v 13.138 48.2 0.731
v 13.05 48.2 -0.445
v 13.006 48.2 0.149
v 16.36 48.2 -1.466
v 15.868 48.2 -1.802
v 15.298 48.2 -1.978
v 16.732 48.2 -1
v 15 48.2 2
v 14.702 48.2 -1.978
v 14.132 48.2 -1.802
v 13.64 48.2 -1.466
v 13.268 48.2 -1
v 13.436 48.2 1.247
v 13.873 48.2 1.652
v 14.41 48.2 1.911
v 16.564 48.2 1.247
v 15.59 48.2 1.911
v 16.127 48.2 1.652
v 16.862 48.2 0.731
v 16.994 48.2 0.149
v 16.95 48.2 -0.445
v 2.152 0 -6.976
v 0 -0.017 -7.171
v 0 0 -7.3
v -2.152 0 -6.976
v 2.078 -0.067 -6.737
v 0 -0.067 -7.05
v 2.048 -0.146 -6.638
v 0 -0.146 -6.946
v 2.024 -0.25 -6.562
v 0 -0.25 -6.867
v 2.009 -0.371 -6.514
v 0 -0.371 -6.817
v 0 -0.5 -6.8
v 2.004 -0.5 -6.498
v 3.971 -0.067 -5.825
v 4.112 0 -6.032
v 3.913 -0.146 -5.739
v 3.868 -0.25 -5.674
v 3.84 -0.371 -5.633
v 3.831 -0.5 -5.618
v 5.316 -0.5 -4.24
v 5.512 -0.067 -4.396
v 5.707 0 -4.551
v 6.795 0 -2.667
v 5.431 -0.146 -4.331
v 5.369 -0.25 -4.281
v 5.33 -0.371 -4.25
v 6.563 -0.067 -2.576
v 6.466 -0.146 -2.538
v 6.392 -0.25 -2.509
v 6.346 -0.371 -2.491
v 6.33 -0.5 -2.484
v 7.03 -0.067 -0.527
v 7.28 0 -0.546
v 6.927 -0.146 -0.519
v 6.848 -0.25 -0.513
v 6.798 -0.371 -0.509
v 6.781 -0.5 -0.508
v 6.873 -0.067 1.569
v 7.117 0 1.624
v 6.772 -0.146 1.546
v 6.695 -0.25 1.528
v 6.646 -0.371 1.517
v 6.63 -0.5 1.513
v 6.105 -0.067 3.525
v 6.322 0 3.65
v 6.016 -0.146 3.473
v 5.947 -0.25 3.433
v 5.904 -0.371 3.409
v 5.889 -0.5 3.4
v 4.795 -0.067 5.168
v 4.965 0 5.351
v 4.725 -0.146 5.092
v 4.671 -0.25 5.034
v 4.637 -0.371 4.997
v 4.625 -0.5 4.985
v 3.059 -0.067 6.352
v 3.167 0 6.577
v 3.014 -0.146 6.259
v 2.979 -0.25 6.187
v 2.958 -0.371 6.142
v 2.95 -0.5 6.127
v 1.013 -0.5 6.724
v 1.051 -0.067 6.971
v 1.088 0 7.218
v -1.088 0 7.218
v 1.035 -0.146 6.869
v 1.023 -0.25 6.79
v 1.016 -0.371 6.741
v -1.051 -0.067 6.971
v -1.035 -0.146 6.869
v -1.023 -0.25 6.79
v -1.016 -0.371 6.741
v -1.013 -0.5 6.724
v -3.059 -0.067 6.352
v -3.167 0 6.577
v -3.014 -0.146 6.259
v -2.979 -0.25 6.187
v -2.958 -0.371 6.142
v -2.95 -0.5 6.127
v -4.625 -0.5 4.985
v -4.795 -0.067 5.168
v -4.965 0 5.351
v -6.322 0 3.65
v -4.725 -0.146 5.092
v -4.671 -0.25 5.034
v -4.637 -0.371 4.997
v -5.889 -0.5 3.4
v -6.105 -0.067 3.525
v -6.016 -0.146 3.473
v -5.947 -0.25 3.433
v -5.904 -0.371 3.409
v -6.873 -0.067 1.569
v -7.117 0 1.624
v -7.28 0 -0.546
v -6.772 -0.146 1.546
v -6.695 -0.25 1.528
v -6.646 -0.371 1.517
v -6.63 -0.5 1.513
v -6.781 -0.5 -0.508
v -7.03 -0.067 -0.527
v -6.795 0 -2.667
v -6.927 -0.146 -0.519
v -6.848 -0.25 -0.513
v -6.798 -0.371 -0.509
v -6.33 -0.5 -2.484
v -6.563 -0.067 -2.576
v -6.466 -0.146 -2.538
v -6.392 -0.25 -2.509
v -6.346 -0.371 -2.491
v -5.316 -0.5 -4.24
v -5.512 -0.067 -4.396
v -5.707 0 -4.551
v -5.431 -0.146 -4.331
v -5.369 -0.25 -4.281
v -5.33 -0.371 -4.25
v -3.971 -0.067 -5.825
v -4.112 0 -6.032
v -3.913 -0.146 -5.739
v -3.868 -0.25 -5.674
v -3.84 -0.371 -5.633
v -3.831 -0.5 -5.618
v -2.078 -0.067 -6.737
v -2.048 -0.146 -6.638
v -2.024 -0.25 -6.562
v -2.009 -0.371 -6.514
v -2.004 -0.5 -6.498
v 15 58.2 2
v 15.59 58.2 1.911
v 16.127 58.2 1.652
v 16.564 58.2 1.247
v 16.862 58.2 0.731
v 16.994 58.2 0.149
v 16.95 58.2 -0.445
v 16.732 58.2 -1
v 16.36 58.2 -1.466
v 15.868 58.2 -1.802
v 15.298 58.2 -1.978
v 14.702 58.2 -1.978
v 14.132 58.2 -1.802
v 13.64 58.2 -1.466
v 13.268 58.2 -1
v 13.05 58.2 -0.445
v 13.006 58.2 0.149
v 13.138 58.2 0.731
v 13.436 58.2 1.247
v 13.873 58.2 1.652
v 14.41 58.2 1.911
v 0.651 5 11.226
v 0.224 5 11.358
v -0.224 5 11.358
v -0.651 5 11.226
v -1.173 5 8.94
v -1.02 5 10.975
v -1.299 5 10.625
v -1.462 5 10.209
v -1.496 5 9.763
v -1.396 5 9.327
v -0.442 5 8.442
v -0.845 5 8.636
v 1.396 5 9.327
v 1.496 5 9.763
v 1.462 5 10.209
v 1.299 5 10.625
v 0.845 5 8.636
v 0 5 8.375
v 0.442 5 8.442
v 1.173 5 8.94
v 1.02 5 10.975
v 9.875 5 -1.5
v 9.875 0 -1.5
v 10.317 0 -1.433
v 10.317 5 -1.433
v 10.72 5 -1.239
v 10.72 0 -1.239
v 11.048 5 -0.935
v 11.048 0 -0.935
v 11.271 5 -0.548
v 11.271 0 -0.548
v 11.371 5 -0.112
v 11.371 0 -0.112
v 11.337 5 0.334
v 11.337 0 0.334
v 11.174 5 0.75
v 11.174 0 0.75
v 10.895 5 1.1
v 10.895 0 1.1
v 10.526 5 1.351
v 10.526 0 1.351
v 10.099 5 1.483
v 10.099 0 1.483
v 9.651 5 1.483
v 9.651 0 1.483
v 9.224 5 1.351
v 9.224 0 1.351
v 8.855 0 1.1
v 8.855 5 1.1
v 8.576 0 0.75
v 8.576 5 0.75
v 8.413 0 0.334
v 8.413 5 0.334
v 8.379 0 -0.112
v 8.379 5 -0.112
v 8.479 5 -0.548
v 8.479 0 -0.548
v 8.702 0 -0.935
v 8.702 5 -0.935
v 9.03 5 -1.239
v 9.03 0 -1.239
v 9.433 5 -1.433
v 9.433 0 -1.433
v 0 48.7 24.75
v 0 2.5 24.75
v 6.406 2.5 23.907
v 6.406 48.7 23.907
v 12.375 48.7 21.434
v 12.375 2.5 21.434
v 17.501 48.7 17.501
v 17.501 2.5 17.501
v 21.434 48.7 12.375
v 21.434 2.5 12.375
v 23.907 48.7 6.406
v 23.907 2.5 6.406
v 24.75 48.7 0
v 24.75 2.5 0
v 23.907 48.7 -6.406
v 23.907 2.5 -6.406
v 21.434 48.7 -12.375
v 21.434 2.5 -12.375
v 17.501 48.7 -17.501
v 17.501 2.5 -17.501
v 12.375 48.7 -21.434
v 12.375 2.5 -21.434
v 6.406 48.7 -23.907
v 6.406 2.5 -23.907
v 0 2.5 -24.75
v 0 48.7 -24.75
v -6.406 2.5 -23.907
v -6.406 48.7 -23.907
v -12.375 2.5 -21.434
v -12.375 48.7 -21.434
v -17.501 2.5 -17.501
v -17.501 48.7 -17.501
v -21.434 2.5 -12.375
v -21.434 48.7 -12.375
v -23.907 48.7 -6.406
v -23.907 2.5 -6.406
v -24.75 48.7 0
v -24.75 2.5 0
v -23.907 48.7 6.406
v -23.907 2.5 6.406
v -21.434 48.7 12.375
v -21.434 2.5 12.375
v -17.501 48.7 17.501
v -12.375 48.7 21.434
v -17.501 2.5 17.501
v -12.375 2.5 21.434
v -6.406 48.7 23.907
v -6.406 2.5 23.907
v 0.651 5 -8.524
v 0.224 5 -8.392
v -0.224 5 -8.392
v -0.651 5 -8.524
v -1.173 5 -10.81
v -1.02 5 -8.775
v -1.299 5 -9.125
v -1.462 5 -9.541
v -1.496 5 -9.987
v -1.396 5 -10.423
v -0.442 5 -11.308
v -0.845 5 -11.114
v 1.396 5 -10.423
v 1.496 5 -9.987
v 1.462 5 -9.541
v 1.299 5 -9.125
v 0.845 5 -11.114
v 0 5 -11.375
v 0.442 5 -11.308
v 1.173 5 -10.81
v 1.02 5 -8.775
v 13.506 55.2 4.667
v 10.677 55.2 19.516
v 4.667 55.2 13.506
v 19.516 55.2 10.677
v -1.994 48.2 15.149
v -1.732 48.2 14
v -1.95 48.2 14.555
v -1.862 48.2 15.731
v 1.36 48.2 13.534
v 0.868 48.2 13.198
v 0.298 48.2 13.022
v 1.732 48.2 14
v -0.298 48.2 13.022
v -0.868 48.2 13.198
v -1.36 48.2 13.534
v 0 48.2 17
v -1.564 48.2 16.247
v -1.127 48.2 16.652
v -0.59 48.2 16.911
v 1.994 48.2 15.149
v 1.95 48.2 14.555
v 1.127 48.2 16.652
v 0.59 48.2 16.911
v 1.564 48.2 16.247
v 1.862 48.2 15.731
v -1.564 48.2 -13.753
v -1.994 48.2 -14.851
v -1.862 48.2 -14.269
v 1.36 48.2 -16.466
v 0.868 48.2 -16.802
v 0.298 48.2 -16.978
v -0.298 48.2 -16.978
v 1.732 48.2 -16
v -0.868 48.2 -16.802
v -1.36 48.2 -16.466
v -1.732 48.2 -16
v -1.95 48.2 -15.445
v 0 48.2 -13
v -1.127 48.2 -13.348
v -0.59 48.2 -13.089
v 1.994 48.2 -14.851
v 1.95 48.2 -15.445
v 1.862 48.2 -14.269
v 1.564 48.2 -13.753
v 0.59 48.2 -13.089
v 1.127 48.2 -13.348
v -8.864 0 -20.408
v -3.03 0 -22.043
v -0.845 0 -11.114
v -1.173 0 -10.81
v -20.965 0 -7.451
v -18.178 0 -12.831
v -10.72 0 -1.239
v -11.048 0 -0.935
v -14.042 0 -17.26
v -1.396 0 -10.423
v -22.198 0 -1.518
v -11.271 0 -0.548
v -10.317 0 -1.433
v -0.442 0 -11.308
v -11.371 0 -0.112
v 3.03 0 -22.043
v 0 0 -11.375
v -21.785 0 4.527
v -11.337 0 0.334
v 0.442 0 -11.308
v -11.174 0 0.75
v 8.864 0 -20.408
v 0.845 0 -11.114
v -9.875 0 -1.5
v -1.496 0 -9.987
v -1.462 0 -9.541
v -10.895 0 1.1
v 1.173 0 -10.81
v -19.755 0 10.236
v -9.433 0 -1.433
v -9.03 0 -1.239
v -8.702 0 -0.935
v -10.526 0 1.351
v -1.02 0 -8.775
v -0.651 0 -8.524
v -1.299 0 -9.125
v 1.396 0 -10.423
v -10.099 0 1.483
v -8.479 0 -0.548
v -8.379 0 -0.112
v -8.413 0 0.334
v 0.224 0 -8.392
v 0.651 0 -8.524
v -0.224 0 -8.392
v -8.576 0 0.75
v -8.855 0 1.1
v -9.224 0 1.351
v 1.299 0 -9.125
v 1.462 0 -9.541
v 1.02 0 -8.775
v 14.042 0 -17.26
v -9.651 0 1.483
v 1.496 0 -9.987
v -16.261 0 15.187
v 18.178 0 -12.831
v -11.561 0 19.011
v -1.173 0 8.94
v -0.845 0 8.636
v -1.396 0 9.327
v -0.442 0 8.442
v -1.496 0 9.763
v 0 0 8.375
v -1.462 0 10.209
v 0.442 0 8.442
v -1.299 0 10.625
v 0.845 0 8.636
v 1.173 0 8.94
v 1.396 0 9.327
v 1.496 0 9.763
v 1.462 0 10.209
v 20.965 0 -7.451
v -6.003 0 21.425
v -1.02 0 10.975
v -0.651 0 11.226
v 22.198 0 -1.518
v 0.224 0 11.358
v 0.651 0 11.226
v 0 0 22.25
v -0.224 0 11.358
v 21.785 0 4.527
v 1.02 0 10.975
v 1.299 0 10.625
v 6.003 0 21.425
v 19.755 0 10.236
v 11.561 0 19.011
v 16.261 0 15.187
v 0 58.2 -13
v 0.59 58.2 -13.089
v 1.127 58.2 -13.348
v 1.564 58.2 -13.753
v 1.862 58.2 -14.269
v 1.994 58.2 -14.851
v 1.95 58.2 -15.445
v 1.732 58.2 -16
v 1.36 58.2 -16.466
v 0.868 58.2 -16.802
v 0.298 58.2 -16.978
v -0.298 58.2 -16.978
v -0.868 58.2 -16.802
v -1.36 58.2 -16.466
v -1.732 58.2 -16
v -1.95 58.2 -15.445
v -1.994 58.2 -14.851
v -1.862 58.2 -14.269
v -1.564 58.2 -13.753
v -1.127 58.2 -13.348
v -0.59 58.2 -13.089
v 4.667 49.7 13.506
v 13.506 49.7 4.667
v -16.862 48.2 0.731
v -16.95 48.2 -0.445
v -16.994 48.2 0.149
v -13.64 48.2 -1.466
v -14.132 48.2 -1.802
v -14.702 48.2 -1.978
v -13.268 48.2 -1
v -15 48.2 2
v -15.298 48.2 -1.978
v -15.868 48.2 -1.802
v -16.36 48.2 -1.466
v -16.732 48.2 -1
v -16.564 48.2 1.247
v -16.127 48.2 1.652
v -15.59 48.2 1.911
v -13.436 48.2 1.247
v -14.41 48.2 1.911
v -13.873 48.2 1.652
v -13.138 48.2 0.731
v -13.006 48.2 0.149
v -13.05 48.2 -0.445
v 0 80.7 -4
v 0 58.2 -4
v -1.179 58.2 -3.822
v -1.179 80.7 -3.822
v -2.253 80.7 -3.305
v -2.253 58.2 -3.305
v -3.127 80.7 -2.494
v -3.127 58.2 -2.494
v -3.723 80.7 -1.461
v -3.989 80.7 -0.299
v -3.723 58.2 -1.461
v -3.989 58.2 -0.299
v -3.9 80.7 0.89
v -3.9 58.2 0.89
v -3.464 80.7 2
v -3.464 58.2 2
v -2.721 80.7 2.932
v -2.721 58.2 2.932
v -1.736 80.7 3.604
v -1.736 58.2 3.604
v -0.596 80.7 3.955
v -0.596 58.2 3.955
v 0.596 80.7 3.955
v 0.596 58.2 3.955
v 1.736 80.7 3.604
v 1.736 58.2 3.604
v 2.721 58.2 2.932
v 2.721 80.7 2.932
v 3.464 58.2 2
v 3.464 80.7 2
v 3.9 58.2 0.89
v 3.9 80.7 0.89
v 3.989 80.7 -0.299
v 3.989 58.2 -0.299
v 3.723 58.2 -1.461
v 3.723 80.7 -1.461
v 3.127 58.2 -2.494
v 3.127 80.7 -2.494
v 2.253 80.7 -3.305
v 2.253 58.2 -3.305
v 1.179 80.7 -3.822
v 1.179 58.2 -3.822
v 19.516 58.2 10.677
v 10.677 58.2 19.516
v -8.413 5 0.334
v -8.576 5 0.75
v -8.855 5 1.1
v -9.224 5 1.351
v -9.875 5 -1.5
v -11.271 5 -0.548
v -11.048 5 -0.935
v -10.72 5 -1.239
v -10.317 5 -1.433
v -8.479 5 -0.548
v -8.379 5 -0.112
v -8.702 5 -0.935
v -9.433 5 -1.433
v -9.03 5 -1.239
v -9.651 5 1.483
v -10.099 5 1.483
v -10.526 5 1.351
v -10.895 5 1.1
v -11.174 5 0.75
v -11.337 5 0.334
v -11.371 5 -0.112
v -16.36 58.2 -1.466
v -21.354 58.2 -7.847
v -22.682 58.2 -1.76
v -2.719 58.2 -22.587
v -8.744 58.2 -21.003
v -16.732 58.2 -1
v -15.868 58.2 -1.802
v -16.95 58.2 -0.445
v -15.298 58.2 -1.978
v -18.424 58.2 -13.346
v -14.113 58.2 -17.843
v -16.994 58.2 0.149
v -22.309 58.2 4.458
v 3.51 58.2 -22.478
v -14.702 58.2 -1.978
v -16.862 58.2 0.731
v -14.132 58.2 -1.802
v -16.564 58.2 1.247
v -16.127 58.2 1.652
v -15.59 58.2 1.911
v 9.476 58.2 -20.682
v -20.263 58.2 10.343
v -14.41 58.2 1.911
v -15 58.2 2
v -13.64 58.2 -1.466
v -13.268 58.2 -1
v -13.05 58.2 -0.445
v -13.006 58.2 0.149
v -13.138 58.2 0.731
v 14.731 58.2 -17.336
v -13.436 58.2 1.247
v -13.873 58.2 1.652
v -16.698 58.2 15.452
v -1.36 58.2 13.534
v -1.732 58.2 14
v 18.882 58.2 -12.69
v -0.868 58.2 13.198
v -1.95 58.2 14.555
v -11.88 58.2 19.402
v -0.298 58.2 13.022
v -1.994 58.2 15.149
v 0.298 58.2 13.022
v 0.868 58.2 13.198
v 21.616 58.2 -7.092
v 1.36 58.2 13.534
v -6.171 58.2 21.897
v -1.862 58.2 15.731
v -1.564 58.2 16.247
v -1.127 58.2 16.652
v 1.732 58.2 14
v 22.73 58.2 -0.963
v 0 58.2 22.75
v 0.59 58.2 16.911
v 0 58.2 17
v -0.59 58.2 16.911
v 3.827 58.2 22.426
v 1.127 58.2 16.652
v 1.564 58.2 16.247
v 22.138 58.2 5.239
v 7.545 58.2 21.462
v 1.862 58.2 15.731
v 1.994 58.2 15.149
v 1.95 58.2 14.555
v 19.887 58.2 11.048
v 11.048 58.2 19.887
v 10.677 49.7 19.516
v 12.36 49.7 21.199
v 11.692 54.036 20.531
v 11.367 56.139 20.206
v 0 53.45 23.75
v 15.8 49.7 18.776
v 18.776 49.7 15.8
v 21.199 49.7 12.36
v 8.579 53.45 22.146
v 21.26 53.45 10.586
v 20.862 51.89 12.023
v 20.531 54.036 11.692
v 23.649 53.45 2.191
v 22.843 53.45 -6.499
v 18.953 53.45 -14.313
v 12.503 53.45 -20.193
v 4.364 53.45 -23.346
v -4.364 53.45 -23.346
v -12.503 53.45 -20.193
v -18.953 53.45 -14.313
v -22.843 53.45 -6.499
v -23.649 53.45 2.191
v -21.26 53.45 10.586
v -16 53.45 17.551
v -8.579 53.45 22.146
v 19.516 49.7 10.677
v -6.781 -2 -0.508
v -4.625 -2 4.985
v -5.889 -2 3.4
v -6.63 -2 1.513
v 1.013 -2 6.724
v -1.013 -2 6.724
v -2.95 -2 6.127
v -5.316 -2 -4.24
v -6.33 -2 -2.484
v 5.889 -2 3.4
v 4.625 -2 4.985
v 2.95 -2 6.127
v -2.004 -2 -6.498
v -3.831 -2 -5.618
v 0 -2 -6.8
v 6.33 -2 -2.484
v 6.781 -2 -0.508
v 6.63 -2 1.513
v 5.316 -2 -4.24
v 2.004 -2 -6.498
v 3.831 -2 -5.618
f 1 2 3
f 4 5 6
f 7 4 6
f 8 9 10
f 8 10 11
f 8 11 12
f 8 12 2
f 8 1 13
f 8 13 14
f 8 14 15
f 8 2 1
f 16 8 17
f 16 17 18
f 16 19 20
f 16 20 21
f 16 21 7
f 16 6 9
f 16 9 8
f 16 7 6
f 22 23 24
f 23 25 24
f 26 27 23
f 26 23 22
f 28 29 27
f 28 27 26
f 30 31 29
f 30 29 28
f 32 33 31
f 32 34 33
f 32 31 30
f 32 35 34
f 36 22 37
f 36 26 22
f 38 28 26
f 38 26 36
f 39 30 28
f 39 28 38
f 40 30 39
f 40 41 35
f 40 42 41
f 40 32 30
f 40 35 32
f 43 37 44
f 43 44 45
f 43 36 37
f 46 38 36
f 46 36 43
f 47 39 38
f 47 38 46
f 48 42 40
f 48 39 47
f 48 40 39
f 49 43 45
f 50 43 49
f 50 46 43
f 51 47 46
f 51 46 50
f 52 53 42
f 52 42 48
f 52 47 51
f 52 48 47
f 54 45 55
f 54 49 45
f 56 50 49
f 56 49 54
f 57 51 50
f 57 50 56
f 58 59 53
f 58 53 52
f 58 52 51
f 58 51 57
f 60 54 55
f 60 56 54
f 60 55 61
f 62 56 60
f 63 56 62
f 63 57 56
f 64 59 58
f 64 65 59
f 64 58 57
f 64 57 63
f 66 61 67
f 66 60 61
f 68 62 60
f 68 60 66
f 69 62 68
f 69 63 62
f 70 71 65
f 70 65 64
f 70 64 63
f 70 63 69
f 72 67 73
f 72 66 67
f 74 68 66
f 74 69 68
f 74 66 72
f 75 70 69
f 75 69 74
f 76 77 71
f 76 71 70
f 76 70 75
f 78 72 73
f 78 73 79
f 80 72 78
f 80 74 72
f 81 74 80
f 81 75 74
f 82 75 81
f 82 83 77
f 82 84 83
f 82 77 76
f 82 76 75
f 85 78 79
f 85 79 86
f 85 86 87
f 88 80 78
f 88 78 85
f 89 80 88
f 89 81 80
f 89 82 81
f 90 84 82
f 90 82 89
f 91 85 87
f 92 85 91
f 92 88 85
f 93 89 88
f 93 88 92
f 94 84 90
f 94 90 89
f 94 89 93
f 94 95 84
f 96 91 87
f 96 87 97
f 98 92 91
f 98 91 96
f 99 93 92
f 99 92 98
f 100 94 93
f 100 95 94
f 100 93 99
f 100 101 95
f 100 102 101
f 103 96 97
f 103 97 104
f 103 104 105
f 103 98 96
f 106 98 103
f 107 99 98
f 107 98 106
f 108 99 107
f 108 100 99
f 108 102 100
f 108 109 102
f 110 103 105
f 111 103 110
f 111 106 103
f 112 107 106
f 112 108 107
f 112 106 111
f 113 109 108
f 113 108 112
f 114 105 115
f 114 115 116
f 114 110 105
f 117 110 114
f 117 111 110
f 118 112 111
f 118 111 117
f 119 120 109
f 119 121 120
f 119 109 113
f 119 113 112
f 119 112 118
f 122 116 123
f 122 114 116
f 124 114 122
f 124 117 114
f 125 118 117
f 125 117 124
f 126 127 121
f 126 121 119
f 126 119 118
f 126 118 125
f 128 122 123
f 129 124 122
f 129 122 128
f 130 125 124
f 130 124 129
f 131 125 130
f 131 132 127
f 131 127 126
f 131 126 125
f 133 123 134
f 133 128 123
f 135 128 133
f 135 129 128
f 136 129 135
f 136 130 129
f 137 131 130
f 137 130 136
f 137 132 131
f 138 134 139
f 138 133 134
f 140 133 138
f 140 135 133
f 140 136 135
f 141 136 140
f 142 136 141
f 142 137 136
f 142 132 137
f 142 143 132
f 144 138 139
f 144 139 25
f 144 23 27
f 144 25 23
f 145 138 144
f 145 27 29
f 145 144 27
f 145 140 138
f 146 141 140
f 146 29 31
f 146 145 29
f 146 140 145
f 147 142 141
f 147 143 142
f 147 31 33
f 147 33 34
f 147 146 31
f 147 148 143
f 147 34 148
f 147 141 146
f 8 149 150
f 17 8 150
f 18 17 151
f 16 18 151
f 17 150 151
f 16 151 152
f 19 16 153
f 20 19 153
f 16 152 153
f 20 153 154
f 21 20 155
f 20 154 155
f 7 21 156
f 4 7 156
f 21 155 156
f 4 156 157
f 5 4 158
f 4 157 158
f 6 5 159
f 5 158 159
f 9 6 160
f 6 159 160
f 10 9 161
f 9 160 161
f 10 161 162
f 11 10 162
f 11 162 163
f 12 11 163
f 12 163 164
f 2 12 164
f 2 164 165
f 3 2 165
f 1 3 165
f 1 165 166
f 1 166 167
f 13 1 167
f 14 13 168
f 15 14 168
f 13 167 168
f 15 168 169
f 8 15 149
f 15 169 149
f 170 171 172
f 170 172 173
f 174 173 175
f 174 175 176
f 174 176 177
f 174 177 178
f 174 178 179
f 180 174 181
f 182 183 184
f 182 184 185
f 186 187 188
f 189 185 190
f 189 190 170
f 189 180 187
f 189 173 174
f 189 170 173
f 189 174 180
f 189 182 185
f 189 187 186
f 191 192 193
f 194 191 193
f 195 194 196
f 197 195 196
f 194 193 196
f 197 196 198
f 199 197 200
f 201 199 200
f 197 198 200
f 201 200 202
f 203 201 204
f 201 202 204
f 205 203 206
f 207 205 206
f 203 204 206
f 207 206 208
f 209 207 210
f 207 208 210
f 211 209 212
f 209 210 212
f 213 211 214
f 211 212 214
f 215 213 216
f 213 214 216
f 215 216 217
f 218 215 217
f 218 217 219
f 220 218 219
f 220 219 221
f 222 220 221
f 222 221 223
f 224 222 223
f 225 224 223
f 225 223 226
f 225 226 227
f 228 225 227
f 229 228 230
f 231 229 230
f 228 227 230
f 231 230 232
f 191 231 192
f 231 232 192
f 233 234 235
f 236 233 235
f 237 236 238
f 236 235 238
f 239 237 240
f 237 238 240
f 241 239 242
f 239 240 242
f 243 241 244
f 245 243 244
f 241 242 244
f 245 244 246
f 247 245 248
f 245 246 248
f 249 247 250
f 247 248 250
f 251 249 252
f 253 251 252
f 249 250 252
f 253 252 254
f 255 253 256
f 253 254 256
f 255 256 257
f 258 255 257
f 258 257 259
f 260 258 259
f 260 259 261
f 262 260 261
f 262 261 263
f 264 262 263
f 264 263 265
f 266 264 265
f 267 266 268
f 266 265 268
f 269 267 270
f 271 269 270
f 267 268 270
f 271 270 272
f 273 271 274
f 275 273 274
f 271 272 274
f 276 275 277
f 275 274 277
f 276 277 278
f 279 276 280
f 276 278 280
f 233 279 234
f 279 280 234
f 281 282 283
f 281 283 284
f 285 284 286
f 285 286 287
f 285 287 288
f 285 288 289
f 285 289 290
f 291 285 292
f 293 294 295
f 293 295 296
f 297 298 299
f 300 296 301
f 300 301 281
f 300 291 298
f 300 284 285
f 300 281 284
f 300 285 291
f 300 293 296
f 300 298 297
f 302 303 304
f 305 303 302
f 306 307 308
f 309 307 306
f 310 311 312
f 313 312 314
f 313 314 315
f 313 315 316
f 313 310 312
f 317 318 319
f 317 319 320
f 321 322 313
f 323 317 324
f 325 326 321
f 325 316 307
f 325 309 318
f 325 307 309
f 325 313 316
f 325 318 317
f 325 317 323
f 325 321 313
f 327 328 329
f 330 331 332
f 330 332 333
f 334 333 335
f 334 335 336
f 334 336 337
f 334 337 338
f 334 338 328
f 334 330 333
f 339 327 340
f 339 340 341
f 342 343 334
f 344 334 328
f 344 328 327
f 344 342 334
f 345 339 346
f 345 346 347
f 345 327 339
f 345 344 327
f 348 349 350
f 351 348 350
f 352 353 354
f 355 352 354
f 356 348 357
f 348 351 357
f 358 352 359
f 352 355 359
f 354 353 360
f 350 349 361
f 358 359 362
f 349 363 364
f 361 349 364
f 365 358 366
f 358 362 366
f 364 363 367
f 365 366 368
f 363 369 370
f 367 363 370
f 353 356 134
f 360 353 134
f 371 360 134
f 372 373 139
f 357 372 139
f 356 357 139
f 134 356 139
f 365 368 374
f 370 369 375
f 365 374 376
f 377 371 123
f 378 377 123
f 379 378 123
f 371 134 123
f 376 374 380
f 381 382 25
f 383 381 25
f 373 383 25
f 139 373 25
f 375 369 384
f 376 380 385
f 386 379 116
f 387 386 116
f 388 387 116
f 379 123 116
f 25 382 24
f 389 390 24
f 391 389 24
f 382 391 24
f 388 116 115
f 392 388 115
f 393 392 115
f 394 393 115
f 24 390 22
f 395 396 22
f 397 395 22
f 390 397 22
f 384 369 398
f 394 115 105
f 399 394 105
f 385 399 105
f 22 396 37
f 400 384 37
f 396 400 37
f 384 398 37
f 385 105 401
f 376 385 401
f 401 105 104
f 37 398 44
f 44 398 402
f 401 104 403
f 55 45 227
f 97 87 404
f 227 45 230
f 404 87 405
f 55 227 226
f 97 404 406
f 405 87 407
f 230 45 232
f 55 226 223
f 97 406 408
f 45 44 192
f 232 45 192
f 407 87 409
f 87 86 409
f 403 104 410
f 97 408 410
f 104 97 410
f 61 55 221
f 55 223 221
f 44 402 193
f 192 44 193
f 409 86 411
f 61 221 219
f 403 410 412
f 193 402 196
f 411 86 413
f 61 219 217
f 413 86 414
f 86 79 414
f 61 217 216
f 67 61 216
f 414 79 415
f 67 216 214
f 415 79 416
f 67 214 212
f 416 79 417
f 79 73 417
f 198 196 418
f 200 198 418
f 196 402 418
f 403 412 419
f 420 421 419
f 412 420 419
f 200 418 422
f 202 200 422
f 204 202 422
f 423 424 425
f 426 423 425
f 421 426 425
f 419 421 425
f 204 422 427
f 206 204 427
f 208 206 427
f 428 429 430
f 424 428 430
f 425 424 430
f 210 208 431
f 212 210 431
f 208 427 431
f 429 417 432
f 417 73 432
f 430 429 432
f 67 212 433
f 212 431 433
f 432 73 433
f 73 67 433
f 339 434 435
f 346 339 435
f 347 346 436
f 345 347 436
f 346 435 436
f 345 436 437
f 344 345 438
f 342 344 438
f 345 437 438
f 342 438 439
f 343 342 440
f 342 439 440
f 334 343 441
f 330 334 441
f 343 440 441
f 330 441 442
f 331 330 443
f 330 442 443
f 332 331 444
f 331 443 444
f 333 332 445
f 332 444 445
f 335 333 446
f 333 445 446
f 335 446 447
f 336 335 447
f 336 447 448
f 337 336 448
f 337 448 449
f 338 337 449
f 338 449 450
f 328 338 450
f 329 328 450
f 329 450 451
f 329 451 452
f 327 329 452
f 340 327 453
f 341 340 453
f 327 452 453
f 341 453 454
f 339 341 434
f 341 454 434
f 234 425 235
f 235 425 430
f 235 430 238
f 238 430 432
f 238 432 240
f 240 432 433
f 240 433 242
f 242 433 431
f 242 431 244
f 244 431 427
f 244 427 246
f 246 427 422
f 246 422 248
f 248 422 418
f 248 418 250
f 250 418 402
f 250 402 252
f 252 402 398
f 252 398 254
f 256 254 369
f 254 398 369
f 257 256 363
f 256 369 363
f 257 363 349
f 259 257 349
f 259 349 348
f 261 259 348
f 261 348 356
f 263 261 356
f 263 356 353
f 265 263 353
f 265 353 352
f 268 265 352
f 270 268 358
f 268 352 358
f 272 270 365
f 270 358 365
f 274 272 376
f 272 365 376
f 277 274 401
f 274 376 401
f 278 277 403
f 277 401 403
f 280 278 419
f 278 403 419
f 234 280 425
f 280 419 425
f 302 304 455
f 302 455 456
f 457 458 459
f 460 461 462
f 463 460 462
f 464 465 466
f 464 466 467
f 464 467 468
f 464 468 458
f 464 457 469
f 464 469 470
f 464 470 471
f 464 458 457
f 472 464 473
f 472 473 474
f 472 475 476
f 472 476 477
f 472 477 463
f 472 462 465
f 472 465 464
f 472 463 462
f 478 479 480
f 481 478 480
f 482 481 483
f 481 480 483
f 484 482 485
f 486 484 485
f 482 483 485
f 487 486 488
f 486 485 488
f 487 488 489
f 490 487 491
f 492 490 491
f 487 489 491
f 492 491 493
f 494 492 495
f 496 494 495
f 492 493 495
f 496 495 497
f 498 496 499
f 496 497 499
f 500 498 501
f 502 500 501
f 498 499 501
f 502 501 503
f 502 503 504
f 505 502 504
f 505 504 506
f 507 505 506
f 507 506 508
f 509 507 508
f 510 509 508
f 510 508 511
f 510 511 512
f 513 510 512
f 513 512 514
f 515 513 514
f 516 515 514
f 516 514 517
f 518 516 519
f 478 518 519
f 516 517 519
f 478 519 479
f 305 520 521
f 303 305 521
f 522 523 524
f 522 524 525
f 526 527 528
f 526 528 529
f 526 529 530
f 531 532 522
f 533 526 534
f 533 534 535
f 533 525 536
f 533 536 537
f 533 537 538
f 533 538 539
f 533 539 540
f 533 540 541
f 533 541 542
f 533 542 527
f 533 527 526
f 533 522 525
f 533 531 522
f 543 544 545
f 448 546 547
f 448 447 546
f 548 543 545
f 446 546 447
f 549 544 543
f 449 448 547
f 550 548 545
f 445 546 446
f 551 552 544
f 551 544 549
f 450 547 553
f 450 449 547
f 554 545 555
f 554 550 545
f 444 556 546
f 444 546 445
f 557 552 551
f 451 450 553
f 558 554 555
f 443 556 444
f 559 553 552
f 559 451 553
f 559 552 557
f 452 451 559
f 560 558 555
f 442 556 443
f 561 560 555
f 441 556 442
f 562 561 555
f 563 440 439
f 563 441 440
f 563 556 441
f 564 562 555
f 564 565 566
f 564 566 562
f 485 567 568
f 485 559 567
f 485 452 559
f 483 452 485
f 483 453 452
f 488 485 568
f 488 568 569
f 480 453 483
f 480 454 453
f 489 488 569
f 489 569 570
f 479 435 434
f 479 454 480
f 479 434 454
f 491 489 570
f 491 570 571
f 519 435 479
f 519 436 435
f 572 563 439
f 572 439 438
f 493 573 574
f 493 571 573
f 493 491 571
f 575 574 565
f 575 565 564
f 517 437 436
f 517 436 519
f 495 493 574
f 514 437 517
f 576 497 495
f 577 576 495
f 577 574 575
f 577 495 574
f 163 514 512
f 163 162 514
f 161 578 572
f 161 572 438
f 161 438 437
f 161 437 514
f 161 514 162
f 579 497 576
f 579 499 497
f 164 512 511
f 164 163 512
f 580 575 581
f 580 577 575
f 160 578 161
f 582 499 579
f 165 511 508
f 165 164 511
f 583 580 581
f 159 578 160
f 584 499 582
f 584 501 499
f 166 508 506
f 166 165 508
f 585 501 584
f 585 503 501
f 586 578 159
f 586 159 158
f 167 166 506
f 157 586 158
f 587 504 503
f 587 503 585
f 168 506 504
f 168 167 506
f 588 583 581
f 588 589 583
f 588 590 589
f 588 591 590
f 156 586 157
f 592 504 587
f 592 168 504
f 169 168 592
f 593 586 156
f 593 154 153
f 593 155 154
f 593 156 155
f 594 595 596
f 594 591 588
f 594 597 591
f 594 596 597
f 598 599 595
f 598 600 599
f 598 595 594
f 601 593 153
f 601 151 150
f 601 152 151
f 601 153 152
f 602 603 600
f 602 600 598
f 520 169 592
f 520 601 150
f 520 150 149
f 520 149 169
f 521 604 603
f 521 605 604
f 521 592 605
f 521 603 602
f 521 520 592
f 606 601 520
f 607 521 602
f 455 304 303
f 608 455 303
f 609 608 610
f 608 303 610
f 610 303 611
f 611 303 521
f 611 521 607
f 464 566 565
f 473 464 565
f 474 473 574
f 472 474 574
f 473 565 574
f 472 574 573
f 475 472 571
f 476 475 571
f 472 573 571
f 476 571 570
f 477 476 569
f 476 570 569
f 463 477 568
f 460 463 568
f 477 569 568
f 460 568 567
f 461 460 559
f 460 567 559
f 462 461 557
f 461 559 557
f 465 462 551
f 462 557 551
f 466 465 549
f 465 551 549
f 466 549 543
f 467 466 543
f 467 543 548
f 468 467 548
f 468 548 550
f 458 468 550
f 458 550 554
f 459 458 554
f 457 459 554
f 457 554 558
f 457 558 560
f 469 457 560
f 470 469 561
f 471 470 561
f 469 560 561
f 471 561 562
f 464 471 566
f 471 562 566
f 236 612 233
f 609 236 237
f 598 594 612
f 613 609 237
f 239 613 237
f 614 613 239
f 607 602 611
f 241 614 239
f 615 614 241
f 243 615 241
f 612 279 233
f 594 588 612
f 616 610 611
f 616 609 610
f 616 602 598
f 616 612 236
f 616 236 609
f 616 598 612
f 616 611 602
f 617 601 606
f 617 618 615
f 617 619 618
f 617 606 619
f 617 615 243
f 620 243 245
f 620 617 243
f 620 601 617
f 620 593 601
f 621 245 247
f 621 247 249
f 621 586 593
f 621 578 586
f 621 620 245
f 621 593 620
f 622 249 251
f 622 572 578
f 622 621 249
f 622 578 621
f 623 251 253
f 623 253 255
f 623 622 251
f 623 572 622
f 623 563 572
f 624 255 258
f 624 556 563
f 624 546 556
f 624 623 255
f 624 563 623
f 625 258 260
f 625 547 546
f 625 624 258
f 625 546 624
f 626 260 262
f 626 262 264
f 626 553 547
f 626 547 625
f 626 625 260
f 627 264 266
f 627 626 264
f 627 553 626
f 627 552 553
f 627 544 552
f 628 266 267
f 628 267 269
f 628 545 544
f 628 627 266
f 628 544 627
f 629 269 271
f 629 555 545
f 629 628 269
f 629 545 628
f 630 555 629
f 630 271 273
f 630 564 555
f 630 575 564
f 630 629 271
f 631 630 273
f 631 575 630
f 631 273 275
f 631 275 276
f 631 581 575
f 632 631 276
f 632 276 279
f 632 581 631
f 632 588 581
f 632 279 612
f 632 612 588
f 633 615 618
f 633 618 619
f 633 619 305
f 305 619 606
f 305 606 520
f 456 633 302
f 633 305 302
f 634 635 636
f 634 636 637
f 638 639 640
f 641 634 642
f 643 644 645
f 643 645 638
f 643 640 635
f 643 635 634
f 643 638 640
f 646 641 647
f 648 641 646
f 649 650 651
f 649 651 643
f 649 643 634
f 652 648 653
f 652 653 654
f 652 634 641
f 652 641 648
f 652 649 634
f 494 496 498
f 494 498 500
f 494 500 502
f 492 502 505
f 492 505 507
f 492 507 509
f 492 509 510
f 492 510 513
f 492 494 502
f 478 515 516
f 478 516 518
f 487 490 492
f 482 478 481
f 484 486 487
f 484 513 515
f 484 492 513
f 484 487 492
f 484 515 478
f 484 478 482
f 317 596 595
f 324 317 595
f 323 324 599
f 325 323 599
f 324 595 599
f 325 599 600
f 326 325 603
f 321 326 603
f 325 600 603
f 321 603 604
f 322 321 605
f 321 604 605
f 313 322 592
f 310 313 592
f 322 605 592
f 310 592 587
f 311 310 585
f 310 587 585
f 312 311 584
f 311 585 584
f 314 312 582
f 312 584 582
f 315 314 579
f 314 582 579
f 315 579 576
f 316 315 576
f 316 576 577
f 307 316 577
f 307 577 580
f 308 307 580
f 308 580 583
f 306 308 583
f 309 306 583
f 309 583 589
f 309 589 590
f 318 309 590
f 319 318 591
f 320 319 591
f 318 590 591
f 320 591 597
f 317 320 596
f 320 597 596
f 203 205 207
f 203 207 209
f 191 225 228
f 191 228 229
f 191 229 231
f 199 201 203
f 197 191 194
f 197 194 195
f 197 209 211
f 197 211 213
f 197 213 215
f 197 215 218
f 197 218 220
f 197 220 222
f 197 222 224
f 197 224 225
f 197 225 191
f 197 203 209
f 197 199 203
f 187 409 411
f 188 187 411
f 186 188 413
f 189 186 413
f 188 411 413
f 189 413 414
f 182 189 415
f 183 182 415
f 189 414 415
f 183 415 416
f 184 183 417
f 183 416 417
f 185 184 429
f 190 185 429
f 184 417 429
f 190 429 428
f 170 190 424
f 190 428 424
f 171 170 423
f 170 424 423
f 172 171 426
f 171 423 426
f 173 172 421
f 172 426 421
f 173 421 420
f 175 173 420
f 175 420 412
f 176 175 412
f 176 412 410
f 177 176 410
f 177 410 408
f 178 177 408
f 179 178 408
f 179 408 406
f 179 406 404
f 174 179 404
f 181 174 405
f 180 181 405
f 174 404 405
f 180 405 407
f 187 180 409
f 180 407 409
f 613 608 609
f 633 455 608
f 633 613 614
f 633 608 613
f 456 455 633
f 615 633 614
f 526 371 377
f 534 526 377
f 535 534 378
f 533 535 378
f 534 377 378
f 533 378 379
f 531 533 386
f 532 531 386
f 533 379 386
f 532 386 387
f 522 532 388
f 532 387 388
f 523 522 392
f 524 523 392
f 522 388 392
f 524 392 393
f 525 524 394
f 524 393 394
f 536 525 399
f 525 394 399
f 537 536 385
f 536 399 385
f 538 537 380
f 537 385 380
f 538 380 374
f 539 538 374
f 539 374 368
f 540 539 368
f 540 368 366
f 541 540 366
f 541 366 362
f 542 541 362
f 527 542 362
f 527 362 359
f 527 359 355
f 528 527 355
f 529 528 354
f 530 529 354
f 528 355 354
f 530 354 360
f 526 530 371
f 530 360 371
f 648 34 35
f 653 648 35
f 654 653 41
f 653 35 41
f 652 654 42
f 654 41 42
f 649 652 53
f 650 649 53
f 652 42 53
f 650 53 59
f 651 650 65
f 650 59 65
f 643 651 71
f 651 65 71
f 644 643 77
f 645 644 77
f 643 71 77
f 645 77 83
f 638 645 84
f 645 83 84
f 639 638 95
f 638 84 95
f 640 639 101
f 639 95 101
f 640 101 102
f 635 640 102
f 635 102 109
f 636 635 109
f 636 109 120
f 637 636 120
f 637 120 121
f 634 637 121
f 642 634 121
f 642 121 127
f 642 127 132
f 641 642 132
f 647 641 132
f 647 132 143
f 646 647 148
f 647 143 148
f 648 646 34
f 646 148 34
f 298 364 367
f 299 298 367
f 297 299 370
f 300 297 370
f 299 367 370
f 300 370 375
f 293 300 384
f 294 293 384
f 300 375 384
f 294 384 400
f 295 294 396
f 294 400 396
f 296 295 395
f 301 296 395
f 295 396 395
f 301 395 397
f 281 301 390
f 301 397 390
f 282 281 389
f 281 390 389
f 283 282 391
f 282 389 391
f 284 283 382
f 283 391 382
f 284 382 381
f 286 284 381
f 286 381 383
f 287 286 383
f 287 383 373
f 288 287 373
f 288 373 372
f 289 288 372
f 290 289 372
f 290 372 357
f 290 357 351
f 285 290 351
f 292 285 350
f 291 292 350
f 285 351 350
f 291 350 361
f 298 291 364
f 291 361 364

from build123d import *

# Parameters (mm, degrees)
SKETCH1_R           = 24.75
BOSS_EXTRUDE1_DEPTH = 58.2
SKETCH2_R           = 4
BOSS_EXTRUDE2_DEPTH = 22.5
CHAMFER1_SIZE       = 2.5
SKETCH3_R           = 6.8
BOSS_EXTRUDE3_DEPTH = 2
FILLET1_R           = 0.5
SKETCH4_R           = 2
CUT_EXTRUDE1_DEPTH  = 10
SKETCH5_R           = 1.5
CUT_EXTRUDE2_DEPTH  = 5
CHAMFER2_SIZE       = 9.5
CHAMFER2_SIZE2      = 2
CUT_EXTRUDE3_DEPTH  = 8.5
SKETCH7_W           = 12.5
SKETCH7_H           = 5.5
CUT_EXTRUDE4_DEPTH  = 8.5


with BuildPart() as part:
    # Sketch1 → Boss-Extrude1 (new body)
    with BuildSketch(Plane(origin=(0, 0, 0), x_dir=(1, 0, 0), z_dir=(0, 1, 0))):
        Circle(SKETCH1_R)
    extrude(amount=BOSS_EXTRUDE1_DEPTH)

    # Sketch2 → Boss-Extrude2 (add)
    with BuildSketch(Plane(origin=(0, 58.2, 0), x_dir=(1, 0, 0), z_dir=(0, 1, 0))):
        Circle(SKETCH2_R)
    extrude(amount=BOSS_EXTRUDE2_DEPTH)

    # Chamfer1
    chamfer1_edges = [part.edges().sort_by_distance(p)[0] for p in [
        (-24.75, 0, 0),
    ]]
    chamfer(chamfer1_edges, length=CHAMFER1_SIZE)

    # Sketch3 → Boss-Extrude3 (add)
    with BuildSketch(Plane.XZ):
        Circle(SKETCH3_R)
    extrude(amount=BOSS_EXTRUDE3_DEPTH)

    # Fillet1
    fillet1_edges = [part.edges().sort_by_distance(p)[0] for p in [
        (-6.8, 0, 0),
    ]]
    fillet(fillet1_edges, radius=FILLET1_R)

    # Sketch4 → Cut-Extrude1 (cut)
    with BuildSketch(Plane(origin=(0, 58.2, 0), x_dir=(1, 0, 0), z_dir=(0, 1, 0))):
        with Locations((0, 15)):
            Circle(SKETCH4_R)
        with Locations((15, 0)):
            Circle(SKETCH4_R)
        with Locations((0, -15)):
            Circle(SKETCH4_R)
        with Locations((-15, 0)):
            Circle(SKETCH4_R)
    extrude(amount=-CUT_EXTRUDE1_DEPTH, mode=Mode.SUBTRACT)

    # Sketch5 → Cut-Extrude2 (cut)
    with BuildSketch(Plane.XZ):
        with Locations((0, 9.875)):
            Circle(SKETCH5_R)
        with Locations((9.875, 0)):
            Circle(SKETCH5_R)
        with Locations((0, -9.875)):
            Circle(SKETCH5_R)
        with Locations((-9.875, 0)):
            Circle(SKETCH5_R)
    extrude(amount=-CUT_EXTRUDE2_DEPTH, mode=Mode.SUBTRACT)

    # Chamfer2
    chamfer2_edges = [part.edges().sort_by_distance(p)[0] for p in [
        (-24.75, 58.2, 0),
    ]]
    chamfer2_side = [part.faces().sort_by_distance(p)[0] for p in [
        (-24.75, 30.35, 0),
    ]]
    chamfer(chamfer2_edges, length=CHAMFER2_SIZE, length2=CHAMFER2_SIZE2, reference=chamfer2_side[0])

    # Sketch6 → Cut-Extrude3 (cut)
    with BuildSketch(Plane(origin=(0, 58.2, 0), x_dir=(1, 0, 0), z_dir=(0, 1, 0))):
        Polygon((19.516147161, -10.677312396), (10.677312396, -19.516147161), (17.748380208, -26.587214973), (26.587214973, -17.748380208), align=None)
    extrude(amount=-CUT_EXTRUDE3_DEPTH, mode=Mode.SUBTRACT)

    # Sketch7 → Cut-Extrude4 (cut)
    with BuildSketch(Plane(origin=(15.096729778, 0, 15.096729778), x_dir=(0.7071067811865476, 0, -0.7071067811865476), z_dir=(0.7071067811865476, 0, 0.7071067811865476))):
        with Locations((0, 52.45)):
            Rectangle(SKETCH7_W, SKETCH7_H)
    extrude(amount=-CUT_EXTRUDE4_DEPTH, mode=Mode.SUBTRACT)


solid = part.part
